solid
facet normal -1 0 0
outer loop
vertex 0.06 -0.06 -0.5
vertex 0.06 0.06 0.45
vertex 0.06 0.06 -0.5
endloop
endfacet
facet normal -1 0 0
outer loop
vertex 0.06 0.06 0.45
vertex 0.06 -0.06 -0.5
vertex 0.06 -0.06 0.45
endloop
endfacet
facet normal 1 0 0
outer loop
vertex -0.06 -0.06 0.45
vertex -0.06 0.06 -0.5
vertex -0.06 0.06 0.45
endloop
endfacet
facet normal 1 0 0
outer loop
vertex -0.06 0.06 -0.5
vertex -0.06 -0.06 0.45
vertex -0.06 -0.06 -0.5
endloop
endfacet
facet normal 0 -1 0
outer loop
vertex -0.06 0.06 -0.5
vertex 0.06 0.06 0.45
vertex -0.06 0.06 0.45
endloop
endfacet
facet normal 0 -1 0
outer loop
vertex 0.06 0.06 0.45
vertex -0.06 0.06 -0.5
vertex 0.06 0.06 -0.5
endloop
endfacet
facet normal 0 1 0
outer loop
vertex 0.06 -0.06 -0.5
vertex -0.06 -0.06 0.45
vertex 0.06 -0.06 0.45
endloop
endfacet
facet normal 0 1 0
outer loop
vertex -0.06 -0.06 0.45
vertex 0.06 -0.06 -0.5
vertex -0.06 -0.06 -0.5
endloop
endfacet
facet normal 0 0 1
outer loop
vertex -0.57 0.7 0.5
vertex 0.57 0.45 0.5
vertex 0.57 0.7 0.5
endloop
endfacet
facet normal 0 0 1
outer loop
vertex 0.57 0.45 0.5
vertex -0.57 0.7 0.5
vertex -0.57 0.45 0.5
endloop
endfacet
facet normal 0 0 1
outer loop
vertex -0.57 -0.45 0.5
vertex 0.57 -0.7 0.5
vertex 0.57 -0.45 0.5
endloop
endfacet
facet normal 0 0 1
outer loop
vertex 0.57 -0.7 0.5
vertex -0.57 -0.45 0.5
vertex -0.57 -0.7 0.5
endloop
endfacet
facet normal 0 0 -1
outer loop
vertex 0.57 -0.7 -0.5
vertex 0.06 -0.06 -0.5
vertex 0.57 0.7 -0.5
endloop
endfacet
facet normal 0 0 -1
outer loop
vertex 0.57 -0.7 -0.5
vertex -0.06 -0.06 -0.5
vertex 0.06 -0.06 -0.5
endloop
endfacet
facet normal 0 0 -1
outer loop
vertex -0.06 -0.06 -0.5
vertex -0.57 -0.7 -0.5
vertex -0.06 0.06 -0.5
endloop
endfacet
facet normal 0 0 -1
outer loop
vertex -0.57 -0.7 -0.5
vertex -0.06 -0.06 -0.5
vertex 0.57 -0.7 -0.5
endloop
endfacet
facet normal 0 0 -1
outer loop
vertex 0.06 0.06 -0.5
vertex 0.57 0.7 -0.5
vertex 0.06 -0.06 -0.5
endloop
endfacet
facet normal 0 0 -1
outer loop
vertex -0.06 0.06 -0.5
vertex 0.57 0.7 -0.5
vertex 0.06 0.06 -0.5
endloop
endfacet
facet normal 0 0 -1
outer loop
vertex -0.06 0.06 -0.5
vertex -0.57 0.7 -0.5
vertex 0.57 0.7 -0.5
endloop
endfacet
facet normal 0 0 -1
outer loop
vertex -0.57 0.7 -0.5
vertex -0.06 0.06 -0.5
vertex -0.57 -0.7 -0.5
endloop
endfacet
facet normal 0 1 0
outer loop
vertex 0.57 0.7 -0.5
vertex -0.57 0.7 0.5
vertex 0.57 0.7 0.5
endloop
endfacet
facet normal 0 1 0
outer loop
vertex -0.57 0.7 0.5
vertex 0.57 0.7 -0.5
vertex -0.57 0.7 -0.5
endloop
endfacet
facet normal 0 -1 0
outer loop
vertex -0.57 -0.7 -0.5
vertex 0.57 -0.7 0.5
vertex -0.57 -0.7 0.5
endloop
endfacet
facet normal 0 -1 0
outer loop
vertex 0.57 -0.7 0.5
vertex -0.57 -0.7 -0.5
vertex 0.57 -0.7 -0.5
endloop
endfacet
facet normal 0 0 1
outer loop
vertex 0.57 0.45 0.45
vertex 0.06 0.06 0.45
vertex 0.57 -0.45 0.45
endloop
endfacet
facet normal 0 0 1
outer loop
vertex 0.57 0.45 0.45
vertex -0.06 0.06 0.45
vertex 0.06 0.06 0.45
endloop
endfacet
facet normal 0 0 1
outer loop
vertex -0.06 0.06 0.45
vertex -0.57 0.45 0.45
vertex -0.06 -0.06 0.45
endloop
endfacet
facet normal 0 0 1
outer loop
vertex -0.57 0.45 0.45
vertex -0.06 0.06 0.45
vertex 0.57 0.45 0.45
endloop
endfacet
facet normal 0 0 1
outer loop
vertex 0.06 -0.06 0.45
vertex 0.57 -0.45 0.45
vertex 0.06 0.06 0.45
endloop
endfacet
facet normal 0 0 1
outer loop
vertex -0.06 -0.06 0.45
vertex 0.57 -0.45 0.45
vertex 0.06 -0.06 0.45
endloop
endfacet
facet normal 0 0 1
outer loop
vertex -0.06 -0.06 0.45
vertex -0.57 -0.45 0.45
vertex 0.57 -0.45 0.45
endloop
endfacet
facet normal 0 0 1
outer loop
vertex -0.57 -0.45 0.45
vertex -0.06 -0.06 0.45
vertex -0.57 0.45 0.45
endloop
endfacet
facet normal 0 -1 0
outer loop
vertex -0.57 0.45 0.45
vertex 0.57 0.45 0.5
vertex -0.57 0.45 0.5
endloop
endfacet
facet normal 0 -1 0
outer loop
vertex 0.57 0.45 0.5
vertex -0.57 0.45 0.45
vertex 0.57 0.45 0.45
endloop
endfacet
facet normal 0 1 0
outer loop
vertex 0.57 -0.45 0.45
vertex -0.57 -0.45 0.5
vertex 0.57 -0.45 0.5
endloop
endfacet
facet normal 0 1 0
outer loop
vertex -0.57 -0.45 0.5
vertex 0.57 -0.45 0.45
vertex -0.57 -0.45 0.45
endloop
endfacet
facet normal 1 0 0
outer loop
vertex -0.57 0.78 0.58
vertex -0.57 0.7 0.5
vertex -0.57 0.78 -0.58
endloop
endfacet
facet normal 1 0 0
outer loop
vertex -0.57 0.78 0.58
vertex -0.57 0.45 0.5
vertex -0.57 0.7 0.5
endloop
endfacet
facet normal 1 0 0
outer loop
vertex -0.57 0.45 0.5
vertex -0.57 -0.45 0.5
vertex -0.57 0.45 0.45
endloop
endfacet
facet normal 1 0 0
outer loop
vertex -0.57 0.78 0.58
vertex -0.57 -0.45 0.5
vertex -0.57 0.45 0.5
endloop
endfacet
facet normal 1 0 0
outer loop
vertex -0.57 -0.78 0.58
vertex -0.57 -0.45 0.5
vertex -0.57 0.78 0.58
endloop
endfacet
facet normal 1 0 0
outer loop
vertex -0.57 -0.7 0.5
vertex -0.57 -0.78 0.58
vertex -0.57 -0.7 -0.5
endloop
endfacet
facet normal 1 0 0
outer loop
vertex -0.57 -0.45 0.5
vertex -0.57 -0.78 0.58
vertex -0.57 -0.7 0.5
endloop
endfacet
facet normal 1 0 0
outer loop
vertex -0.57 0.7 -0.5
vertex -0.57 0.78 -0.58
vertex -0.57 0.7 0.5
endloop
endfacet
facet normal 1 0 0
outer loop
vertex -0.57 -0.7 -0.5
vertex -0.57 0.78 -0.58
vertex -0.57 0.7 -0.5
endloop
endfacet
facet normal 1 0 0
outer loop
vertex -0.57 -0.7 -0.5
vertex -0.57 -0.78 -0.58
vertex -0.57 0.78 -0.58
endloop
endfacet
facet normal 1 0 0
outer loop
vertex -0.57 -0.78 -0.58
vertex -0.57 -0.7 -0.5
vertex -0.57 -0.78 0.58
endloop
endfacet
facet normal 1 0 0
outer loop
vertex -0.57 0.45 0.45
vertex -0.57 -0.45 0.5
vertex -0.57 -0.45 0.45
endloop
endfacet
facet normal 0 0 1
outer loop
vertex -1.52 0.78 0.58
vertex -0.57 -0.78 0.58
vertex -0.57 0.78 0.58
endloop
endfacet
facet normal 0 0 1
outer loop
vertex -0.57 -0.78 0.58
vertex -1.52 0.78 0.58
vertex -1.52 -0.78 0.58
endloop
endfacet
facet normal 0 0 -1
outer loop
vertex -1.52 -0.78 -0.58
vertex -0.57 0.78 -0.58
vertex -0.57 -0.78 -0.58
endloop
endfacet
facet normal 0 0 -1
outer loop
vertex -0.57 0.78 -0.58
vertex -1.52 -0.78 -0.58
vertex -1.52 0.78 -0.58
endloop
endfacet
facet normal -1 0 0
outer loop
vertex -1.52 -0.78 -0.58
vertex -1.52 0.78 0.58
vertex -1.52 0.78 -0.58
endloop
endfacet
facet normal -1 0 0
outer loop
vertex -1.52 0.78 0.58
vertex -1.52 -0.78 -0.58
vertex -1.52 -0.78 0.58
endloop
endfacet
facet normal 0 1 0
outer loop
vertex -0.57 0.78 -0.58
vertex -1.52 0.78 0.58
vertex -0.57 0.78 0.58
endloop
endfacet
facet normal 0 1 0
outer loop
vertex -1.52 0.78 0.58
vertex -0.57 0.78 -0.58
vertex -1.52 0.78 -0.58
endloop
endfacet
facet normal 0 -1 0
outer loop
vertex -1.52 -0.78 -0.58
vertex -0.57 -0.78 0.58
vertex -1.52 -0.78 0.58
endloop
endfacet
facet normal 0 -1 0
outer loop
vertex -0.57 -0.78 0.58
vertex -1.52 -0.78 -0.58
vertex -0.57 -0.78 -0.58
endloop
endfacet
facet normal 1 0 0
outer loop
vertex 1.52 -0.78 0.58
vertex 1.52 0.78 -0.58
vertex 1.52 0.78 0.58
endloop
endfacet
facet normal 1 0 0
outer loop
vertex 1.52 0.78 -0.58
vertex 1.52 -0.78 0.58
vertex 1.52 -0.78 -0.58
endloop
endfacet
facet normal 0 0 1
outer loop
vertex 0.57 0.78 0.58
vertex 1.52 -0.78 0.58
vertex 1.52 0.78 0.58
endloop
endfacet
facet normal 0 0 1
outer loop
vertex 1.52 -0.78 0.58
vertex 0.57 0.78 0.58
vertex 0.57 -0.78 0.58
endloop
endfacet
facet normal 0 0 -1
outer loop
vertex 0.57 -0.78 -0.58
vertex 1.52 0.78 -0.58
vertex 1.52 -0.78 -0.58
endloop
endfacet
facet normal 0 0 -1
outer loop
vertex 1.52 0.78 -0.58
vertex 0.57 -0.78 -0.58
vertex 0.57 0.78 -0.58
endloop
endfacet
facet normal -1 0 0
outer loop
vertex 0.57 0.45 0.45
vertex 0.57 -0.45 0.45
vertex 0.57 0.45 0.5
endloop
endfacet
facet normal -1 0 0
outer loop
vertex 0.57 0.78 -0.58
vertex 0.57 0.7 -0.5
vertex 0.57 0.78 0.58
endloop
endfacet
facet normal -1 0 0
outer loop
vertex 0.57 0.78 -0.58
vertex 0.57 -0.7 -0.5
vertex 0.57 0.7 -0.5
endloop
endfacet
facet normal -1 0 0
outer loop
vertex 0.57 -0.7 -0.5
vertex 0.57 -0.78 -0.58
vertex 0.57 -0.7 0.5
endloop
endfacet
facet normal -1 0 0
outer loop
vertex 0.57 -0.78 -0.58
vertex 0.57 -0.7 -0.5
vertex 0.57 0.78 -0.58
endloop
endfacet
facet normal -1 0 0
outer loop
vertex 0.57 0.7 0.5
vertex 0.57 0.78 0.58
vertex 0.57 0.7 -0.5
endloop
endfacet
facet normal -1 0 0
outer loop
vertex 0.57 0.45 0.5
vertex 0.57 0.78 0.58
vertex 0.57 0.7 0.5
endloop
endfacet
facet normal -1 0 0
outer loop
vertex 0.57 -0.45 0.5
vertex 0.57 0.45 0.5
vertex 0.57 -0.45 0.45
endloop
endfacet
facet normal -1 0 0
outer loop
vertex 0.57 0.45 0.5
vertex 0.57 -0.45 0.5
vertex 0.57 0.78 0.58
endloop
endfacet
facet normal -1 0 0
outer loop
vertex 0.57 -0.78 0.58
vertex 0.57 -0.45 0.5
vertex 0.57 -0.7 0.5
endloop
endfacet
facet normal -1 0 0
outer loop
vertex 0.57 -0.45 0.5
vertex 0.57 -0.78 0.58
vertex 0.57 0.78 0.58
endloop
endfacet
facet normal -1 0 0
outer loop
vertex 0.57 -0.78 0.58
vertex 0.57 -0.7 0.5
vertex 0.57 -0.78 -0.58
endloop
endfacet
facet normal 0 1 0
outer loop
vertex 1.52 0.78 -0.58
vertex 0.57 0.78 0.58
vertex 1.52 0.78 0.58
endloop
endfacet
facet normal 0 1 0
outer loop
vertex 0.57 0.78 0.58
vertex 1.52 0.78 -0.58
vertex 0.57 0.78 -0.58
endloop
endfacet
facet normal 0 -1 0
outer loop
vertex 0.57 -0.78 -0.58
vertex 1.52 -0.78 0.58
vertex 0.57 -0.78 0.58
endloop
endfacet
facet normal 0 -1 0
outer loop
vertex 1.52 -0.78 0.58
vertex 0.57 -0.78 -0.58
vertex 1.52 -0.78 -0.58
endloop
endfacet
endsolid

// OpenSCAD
// Parameters
body_L = 3; //[1.5:6:0.1]
body_W = 1.4; //[0.7:2.8:0.1]
body_H = 1; //[0.5:2:0.1]
term_thk = 0.08; //[0.04:0.2:0.01]
term_len = 0.35; //[0.15:0.8:0.05]
term_overlap = 0.6; //[0.3:1.2:0.05]
chamfer = 0.12; //[0.05:0.3:0.01]
mark_depth = 0.05; //[0.02:0.15:0.01]
mark_margin = 0.25; //[0.1:0.6:0.05]
polarity_r = 0.18; //[0.08:0.4:0.01]
eps = 0.02; //[0.01:0.1:0.01]

// Base Shapes
module smd_body() {
  cube([body_L, body_W, body_H], center=true);
}

module metal_termination_left() {
  translate([-body_L/2 + (term_len + term_overlap)/2 - eps, 0, 0])
    cube([term_len + term_overlap, body_W + 2*term_thk, body_H + 2*term_thk], center=true);
}

module metal_termination_right() {
  translate([body_L/2 - (term_len + term_overlap)/2 + eps, 0, 0])
    cube([term_len + term_overlap, body_W + 2*term_thk, body_H + 2*term_thk], center=true);
}

module edge_chamfer_corner_cut() {
  cube([chamfer, chamfer, body_H + 2*eps], center=true);
}

module top_marking() {
  translate([0, 0, body_H/2 - (mark_depth + eps)/2 + eps])
    cube([body_L - 2*mark_margin, body_W - 2*mark_margin, mark_depth + eps], center=true);
}

module polarity_mark() {
  translate([-body_L/2 + mark_margin + polarity_r, body_W/2 - mark_margin - polarity_r, body_H/2 - (mark_depth + 2*eps)/2 + eps])
    cylinder(r=polarity_r, h=mark_depth + 2*eps, center=true);
}

// Operations
module metal_terminations() {
  union() {
    metal_termination_left();
    metal_termination_right();
  }
}

module edge_chamfer() {
  union() {
    edge_chamfer_corner_cut();
    rotate([0, 0, 90]) edge_chamfer_corner_cut();
    rotate([0, 0, 180]) edge_chamfer_corner_cut();
    rotate([0, 0, 270]) edge_chamfer_corner_cut();
  }
}

module smd_body_chamfered() {
  difference() {
    smd_body();
    edge_chamfer();
  }
}

module smd_body_marked() {
  difference() {
    smd_body_chamfered();
    top_marking();
    polarity_mark();
  }
}

module smd_complete() {
  union() {
    smd_body_marked();
    metal_terminations();
  }
}

// Final Output
smd_complete();
